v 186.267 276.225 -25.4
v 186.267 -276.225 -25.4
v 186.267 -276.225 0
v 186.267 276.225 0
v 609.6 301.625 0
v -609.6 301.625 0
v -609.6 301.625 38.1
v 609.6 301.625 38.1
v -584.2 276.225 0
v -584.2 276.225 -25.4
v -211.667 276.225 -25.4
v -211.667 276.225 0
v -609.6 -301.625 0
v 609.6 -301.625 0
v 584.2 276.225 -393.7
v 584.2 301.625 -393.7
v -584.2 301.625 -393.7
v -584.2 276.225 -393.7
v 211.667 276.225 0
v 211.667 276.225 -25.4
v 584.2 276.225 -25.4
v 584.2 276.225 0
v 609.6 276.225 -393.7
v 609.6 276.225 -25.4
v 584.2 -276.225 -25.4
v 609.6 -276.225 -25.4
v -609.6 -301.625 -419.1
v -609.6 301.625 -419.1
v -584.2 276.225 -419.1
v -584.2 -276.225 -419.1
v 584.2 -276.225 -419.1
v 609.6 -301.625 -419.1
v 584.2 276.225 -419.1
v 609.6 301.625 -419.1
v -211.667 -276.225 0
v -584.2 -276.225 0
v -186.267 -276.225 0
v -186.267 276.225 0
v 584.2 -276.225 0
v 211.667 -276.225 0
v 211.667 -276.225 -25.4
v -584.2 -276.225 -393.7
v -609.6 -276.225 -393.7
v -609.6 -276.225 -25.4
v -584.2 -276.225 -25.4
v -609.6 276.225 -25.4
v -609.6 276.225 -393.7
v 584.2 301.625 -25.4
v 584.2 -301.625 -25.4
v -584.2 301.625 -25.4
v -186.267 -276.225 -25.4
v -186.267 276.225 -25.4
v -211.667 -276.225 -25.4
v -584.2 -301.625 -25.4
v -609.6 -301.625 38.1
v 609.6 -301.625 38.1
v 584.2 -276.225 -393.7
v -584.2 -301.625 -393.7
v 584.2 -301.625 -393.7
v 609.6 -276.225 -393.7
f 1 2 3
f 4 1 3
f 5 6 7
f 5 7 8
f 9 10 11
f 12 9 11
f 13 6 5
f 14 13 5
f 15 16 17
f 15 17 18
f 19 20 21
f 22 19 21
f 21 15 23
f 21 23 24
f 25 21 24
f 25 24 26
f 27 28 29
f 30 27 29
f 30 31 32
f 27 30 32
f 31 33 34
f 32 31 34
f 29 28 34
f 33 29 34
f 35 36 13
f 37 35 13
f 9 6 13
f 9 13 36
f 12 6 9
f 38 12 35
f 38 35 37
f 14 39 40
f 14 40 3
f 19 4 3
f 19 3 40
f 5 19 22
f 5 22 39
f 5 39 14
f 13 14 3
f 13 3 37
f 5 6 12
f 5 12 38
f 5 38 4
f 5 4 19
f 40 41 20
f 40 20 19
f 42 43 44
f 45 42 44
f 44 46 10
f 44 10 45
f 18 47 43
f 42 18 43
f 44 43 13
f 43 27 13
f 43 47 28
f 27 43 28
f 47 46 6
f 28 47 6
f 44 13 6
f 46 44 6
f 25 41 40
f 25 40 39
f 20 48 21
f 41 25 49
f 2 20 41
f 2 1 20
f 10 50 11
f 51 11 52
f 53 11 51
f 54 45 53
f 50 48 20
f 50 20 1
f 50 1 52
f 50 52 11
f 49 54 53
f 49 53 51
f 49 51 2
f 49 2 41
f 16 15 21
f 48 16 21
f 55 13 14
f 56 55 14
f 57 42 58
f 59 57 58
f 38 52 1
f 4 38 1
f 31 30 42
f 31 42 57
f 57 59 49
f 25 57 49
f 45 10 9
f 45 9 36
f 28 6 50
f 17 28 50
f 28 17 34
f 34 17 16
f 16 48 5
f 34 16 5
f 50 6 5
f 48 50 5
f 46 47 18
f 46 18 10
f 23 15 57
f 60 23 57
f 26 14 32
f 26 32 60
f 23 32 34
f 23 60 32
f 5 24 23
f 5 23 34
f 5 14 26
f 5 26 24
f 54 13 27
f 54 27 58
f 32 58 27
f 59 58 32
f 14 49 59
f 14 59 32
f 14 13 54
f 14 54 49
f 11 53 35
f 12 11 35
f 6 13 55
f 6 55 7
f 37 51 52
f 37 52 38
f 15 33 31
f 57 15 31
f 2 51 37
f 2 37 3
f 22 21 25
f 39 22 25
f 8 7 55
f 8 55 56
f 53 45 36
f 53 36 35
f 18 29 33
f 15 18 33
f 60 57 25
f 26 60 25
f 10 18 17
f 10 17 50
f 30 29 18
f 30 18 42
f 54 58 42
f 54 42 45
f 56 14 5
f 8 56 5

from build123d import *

# Parameters (mm, degrees)
F0_W      = 1219.2
F0_H      = 603.25
F1_DEPTH  = 38.1
F2_DEPTH  = 419.1
F3_W      = 1168.4
F3_H      = 368.3
F4_DEPTH  = 603.251
F5_W      = 552.45
F5_H      = 368.3
F6_DEPTH  = 1219.201
F7_W      = 1168.4
F7_H      = 552.45
F8_DEPTH  = 457.201
F9_W      = 25.4
F9_H      = 25.4
F10_DEPTH = 552.45


with BuildPart() as f1:
    # F0 (on Top) → F1 (new body)
    with BuildSketch(Plane.XY):
        Rectangle(F0_W, F0_H)
    extrude(amount=F1_DEPTH)


with BuildPart() as f2:
    # F2 (new): a face of the model
    f2_faces = [f1.part.faces().sort_by_distance(p)[0] for p in [
        (0, 0, 0),
    ]]
    extrude(f2_faces, amount=F2_DEPTH)

    # F3 (on face) → F4 (cut, through all)
    with BuildSketch(Plane.XZ.offset(301.625)):
        with Locations((0, -209.55)):
            Rectangle(F3_W, F3_H)
    extrude(amount=-F4_DEPTH, mode=Mode.SUBTRACT)

    # F5 (on face) → F6 (cut, through all)
    with BuildSketch(Plane(origin=(-609.6, 0, 0), x_dir=(0, -1, 0), z_dir=(-1, 0, 0))):
        with Locations((0, -209.55)):
            Rectangle(F5_W, F5_H)
    extrude(amount=-F6_DEPTH, mode=Mode.SUBTRACT)

    # F7 (on face) → F8 (cut, through all)
    with BuildSketch(Plane(origin=(0, 0, -419.1), x_dir=(1, 0, 0), z_dir=(0, 0, -1))):
        Rectangle(F7_W, F7_H)
    extrude(amount=-F8_DEPTH, mode=Mode.SUBTRACT)

    # F9 (on face) → F10 (join, through all)
    with BuildSketch(Plane(origin=(0, -276.225, 0), x_dir=(-1, 0, 0), z_dir=(0, 1, 0))):
        with Locations((-198.9666666667, -12.7)):
            Rectangle(F9_W, F9_H)
        with Locations((198.9666666667, -12.7)):
            Rectangle(F9_W, F9_H)
    extrude(amount=F10_DEPTH)


solid = Compound([f1.part, f2.part])
